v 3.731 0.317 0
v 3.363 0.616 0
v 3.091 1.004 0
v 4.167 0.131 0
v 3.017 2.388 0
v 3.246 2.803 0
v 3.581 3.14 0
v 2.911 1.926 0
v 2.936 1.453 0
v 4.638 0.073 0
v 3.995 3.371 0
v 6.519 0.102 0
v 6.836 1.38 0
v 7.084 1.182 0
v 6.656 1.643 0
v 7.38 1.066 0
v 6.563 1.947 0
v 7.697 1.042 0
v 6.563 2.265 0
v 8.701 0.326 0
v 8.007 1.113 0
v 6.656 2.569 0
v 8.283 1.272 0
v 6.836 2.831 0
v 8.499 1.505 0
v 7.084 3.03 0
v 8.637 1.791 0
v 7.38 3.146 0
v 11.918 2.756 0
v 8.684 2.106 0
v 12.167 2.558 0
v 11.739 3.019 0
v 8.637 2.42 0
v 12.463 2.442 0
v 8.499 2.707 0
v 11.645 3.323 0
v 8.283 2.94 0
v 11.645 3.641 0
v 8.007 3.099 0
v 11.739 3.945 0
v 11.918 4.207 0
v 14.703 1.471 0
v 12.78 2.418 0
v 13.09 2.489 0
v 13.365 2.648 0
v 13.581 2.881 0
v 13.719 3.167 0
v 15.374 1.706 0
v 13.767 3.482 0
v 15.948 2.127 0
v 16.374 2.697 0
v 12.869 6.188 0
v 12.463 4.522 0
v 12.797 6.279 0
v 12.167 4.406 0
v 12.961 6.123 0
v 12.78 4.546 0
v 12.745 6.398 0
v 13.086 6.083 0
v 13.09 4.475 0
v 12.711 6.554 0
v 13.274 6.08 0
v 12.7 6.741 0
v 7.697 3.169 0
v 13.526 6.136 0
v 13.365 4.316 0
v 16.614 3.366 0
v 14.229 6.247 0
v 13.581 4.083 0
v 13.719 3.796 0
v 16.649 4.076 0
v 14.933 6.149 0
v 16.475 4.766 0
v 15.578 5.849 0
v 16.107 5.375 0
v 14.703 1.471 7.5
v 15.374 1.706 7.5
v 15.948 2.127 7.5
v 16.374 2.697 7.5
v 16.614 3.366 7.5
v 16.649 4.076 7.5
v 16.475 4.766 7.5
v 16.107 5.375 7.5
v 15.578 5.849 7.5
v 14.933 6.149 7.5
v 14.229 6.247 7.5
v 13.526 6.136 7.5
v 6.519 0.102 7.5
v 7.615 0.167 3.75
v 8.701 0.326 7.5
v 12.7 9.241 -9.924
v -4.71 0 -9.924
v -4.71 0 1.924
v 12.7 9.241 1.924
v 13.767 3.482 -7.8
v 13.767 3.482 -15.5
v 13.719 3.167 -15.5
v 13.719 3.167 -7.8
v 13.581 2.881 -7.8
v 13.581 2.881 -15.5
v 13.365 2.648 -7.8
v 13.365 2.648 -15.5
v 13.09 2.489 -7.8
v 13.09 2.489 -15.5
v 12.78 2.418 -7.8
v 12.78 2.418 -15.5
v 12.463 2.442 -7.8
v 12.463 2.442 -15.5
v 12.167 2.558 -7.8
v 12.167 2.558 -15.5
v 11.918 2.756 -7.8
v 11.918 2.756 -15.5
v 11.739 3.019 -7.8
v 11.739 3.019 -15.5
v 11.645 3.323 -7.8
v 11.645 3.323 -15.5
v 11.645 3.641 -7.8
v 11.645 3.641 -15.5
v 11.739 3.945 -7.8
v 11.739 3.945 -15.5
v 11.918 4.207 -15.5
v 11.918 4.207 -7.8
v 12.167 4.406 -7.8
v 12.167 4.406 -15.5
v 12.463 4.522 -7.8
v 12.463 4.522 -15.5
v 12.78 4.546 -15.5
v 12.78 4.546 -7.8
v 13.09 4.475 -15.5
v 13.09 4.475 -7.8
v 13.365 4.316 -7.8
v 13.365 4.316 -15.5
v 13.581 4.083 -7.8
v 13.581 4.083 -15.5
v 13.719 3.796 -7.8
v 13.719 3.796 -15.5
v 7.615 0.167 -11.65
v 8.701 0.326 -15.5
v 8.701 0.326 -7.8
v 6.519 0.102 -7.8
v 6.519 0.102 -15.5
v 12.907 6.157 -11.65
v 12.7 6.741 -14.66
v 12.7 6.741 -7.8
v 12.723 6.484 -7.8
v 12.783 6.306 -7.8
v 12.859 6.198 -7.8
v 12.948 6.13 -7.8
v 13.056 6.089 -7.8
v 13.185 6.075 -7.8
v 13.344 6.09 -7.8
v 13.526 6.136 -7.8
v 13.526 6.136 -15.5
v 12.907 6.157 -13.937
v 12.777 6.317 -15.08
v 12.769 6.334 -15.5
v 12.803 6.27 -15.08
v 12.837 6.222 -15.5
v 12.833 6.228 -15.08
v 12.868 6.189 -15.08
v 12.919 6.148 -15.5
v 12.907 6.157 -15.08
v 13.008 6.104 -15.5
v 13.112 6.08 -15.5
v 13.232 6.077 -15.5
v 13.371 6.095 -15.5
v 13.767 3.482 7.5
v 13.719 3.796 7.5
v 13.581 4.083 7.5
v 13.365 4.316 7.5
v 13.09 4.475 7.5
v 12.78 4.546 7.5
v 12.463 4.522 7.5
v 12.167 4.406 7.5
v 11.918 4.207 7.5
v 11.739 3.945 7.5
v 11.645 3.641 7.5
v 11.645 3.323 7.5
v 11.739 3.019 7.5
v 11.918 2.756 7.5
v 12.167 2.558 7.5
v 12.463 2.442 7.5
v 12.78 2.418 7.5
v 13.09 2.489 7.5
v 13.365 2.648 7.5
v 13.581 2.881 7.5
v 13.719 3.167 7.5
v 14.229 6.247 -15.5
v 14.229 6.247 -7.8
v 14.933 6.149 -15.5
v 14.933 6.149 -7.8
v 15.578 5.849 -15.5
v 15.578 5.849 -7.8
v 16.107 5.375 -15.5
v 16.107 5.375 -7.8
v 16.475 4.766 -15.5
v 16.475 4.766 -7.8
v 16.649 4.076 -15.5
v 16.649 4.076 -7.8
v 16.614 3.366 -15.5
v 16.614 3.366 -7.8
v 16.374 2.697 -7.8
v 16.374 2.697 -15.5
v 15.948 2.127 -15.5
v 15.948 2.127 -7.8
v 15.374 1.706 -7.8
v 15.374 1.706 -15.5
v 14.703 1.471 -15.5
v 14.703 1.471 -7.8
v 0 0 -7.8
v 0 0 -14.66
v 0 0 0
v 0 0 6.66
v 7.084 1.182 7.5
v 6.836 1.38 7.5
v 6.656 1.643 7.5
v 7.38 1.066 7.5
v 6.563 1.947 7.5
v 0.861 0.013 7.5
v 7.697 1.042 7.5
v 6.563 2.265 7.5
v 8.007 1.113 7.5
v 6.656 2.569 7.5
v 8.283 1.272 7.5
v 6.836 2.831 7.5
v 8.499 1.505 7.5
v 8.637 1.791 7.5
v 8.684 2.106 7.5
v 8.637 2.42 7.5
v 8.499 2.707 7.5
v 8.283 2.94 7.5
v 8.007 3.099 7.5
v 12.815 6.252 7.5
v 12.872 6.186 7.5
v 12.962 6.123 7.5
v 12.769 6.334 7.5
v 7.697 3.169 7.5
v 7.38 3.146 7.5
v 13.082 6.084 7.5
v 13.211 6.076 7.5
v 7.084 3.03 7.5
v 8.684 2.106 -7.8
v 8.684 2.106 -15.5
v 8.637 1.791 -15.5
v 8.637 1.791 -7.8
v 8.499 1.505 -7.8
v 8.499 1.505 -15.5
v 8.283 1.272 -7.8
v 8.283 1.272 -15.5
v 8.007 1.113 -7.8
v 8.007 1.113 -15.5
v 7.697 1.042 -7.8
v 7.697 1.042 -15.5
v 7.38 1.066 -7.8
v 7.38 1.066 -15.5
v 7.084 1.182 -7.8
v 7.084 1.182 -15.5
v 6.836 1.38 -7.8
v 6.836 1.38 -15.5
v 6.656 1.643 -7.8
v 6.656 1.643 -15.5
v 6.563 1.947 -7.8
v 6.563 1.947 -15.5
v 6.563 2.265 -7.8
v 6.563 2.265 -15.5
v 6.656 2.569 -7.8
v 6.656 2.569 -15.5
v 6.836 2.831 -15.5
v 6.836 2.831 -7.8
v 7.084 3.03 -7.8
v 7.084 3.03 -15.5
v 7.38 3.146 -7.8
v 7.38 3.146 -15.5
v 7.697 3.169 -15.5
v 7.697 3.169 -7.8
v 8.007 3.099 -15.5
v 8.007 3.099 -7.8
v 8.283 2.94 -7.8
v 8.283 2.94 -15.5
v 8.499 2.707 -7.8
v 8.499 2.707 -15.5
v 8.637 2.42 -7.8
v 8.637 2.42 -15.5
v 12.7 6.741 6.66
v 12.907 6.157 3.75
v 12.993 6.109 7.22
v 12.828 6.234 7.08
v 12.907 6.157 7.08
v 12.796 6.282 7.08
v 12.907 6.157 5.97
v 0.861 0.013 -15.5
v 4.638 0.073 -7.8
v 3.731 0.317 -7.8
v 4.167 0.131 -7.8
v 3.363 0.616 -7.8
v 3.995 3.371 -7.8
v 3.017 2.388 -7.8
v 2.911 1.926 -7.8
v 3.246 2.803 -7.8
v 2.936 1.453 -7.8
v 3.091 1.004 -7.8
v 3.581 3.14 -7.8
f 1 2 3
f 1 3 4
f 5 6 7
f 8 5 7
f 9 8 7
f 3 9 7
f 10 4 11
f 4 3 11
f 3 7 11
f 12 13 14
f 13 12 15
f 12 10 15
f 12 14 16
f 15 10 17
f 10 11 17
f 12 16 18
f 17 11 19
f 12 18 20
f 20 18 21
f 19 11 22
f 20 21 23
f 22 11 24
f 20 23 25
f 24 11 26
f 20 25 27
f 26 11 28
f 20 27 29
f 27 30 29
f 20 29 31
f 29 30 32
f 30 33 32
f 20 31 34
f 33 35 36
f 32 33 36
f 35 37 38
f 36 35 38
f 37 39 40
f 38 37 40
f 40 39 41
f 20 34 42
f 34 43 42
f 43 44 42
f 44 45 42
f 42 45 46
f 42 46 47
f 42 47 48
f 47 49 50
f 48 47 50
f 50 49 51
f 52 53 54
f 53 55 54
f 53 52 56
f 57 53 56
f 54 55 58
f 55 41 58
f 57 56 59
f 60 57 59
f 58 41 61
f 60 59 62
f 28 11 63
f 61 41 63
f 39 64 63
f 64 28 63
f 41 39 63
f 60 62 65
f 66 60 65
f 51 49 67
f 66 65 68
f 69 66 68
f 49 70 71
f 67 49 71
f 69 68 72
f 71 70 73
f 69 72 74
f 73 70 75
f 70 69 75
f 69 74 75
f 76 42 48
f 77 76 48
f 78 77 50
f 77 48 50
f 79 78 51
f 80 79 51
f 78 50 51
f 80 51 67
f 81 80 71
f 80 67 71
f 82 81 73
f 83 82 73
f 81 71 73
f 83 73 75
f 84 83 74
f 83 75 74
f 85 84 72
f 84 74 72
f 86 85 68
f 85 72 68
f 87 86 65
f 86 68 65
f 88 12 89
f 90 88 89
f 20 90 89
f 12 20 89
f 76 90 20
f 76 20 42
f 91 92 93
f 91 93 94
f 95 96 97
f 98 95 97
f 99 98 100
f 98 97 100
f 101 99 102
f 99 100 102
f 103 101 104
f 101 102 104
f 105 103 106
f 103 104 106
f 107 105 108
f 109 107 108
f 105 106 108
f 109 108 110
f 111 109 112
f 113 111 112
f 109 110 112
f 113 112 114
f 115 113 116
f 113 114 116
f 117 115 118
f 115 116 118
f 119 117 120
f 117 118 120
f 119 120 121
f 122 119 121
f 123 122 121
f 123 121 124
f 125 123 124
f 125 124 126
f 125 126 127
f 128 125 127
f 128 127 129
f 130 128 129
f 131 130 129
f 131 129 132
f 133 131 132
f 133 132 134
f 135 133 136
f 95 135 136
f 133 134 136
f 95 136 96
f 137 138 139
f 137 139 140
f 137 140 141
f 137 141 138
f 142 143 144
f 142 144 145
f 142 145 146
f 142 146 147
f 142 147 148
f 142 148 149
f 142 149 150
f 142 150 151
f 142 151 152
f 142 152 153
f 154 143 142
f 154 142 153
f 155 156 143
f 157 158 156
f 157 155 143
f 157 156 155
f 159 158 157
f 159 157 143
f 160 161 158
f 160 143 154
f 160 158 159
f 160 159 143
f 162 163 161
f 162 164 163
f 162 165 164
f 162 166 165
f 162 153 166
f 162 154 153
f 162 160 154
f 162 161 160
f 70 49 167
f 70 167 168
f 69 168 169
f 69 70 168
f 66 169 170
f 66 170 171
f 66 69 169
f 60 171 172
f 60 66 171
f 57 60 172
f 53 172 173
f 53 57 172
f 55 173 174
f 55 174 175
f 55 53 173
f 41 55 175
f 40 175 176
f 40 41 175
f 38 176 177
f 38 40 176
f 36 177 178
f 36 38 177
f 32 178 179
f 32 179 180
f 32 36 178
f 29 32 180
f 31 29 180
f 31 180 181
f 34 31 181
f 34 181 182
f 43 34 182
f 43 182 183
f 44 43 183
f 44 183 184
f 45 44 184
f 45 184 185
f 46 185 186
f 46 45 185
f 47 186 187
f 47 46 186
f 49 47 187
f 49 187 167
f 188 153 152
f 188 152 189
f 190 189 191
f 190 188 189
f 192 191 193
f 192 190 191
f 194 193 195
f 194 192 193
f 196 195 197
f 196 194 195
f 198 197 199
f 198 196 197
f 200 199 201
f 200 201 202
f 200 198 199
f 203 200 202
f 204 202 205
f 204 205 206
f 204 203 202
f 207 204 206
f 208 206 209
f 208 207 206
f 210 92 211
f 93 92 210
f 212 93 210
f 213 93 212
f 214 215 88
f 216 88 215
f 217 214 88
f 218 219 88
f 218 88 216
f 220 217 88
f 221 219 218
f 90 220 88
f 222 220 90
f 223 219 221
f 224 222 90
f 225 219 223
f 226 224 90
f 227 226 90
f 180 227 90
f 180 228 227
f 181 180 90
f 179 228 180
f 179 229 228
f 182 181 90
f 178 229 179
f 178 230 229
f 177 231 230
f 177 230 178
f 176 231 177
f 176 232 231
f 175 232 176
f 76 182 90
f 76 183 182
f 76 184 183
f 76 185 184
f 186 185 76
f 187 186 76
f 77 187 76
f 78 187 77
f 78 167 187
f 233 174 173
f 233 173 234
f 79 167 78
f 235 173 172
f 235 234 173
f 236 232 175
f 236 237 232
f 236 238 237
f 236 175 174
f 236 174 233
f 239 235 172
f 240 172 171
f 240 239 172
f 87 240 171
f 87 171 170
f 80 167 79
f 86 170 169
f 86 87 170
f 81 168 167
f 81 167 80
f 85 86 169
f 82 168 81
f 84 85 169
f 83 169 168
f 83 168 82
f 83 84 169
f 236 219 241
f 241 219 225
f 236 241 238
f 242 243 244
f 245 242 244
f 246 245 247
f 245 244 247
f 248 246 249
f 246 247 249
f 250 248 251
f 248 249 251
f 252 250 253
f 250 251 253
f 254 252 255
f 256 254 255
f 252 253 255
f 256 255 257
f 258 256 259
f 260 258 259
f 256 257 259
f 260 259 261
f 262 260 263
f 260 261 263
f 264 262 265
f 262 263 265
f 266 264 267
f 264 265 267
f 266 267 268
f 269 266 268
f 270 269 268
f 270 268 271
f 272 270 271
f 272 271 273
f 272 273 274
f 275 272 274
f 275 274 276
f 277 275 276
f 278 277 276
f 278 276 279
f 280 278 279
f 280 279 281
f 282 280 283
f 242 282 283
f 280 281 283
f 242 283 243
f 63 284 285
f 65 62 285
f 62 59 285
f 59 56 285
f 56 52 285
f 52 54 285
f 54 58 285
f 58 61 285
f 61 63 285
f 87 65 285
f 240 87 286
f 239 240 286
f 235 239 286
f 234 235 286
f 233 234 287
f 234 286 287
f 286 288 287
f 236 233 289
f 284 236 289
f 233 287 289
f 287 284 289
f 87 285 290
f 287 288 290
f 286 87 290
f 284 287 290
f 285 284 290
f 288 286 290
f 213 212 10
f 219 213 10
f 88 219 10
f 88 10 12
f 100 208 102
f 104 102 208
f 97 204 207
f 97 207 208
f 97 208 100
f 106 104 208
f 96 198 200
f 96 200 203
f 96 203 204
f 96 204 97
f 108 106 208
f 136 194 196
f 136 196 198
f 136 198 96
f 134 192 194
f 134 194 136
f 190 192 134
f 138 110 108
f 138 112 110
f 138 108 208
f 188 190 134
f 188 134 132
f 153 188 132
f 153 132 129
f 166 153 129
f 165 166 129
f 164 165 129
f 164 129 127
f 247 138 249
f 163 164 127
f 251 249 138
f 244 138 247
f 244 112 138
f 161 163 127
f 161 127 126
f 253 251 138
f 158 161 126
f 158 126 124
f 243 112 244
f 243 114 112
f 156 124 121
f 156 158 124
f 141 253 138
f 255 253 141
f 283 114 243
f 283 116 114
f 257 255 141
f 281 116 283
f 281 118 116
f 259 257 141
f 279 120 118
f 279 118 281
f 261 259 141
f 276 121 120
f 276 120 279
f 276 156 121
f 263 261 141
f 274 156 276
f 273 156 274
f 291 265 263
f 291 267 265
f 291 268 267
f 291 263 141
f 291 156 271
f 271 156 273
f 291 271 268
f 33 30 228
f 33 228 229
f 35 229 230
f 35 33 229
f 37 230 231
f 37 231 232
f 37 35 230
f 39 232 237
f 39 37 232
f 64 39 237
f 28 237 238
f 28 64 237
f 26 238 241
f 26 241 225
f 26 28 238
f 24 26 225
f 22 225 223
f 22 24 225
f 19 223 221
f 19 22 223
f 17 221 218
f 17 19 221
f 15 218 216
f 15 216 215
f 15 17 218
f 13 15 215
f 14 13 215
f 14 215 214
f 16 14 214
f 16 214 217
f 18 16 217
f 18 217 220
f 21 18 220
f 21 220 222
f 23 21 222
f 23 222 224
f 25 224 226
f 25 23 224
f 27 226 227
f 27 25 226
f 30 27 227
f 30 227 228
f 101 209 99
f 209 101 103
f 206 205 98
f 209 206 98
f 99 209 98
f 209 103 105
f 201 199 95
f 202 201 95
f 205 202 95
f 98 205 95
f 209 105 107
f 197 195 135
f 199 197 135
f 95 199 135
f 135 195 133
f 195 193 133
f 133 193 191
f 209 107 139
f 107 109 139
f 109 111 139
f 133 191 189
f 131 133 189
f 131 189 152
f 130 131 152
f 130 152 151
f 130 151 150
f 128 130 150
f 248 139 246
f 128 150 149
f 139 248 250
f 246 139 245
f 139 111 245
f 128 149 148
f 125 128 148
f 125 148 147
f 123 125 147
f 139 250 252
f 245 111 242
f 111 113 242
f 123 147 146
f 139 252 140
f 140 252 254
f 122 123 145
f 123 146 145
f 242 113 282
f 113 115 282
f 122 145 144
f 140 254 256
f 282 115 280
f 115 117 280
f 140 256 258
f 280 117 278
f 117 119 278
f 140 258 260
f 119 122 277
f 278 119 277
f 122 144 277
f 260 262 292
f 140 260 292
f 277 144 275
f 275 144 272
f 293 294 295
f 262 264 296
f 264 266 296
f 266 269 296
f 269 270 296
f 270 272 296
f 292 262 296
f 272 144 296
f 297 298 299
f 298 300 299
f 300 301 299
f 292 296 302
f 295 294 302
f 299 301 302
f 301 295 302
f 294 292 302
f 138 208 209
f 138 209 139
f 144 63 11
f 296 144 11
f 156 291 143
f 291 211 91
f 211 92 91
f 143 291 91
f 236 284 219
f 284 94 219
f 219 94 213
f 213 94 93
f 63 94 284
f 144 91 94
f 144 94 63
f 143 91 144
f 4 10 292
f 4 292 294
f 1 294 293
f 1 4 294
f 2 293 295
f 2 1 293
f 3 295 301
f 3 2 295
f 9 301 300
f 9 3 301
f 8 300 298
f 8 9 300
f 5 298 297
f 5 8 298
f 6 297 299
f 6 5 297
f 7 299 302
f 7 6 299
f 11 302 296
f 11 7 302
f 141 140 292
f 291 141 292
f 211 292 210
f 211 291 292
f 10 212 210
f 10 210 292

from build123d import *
from OCP.BRepFilletAPI import BRepFilletAPI_MakeChamfer

# Parameters (mm, degrees)
SKETCH1_R           = 1.0668
BOSS_EXTRUDE1_DEPTH = 7.5
BOSS_EXTRUDE2_DEPTH = 7.8
BOSS_EXTRUDE3_START = 7.7
SKETCH3_R           = 1.0668
BOSS_EXTRUDE3_DEPTH = 7.7
BOSS_EXTRUDE4_DEPTH = 23
CHAMFER1_SIZE       = 2.6
CHAMFER1_SIZE2      = 5.575717993


with BuildPart() as part:
    # Sketch1 → Boss-Extrude1 (new body)
    with BuildSketch(Plane.XY):
        with BuildLine():
            Line((0, 0), (6.519373857, 0.102105999))
            add(Edge.make_bspline(
                [(6.519373857, 0.102105999), (7.62, 0.119343933), (8.701246874, 0.325693755)],
                knots=[0, 0, 0, 1, 1, 1], degree=2))
            Line((8.701246874, 0.325693755), (14.703179453, 1.471128487))
            ThreePointArc((14.703179453, 1.471128487), (16.587758943, 4.427434521), (13.526155588, 6.135641216))
            add(Edge.make_bspline(
                [(13.526155588, 6.135641216), (12.7, 5.874844246), (12.7, 6.741186046)],
                knots=[0, 0, 0, 1, 1, 1], degree=2))
            Line((12.7, 6.741186046), (12.7, 9.241186046))
            Line((12.7, 9.241186046), (-4.709853694, 0))
            Line((-4.709853694, 0), (0, 0))
        make_face()
        with Locations((12.7, 3.481838658)):
            Circle(SKETCH1_R, mode=Mode.SUBTRACT)
        with Locations((7.617577591, 2.105666766)):
            Circle(SKETCH1_R, mode=Mode.SUBTRACT)
    extrude(amount=BOSS_EXTRUDE1_DEPTH)

    # Sketch2 → Boss-Extrude2 (add)
    with BuildSketch(Plane(origin=(0, 0, 0), x_dir=(-1, 0, 0), z_dir=(0, 0, -1))):
        Polygon((-12.7, 6.741186046), (4.709853694, 0), (-12.7, 9.241186046), align=None)
    extrude(amount=BOSS_EXTRUDE2_DEPTH)

    # Sketch3 → Boss-Extrude3 (add)
    with BuildSketch(Plane(origin=(0, 0, -7.8), x_dir=(-1, 0, 0), z_dir=(0, 0, -1)).offset(BOSS_EXTRUDE3_START)):
        with BuildLine():
            Line((-12.7, 9.241186046), (-12.7, 6.741186047))
            add(Edge.make_bspline(
                [(-12.7, 6.741186047), (-12.7, 5.874844247), (-13.526155587, 6.135641216)],
                knots=[0, 0, 0, 1, 1, 1], degree=2))
            ThreePointArc((-13.526155587, 6.135641216), (-16.587758943, 4.427434521), (-14.703179453, 1.471128487))
            Line((-14.703179453, 1.471128487), (-8.70124687, 0.325693755))
            add(Edge.make_bspline(
                [(-8.70124687, 0.325693755), (-7.619999998, 0.119343933), (-6.519373857, 0.102105999)],
                knots=[0, 0, 0, 1, 1, 1], degree=2))
            Line((-6.519373857, 0.102105999), (0, 0))
            Line((0, 0), (4.709853694, 0))
            Line((4.709853694, 0), (-12.7, 9.241186046))
        make_face()
        with Locations(Location((-12.7, 3.481838658, 0), (0, 0, 180))):
            Circle(SKETCH3_R, mode=Mode.SUBTRACT)
        with Locations(Location((-7.617577591, 2.105666766, 0), (0, 0, 180))):
            Circle(SKETCH3_R, mode=Mode.SUBTRACT)
    extrude(amount=-BOSS_EXTRUDE3_DEPTH)

    # Sketch4 → Boss-Extrude4 (add)
    with BuildSketch(Plane.XY.offset(7.5)):
        with BuildLine():
            Line((0, 0), (4.638040447, 0.072640681))
            ThreePointArc((4.638040447, 0.072640681), (2.936201023, 1.452503315), (3.995073153, 3.370593023))
            Line((3.995073153, 3.370593023), (3.995073153, 4.620593023))
            Line((3.995073153, 4.620593023), (-4.709853694, 0))
            Line((-4.709853694, 0), (0, 0))
        make_face()
    extrude(amount=-BOSS_EXTRUDE4_DEPTH)

    # Chamfer1: one chamfer whose edges measure the first distance from different faces: ONE call of the kernel's chamfer builder (chamfer() names one face for all edges)
    chamfer1_edges_1 = [part.edges().sort_by_distance(p)[0] for p in [
        (3.995073153, 4.620593023, 7.5),
    ]]
    chamfer1_side_1 = [part.faces().sort_by_distance(p)[0] for p in [
        (7.962373857, 3.352750827, 7.5),
    ]]
    chamfer1_edges_2 = [part.edges().sort_by_distance(p)[0] for p in [
        (3.995073153, 4.620593023, -15.5),
    ]]
    chamfer1_side_2 = [part.faces().sort_by_distance(p)[0] for p in [
        (7.962373857, 3.352750827, -15.5),
    ]]
    chamfer1 = BRepFilletAPI_MakeChamfer(part.part.solid().wrapped)
    for e in chamfer1_edges_1:
        chamfer1.Add(CHAMFER1_SIZE, CHAMFER1_SIZE2, e.wrapped, chamfer1_side_1[0].wrapped)  # the first distance lies on this face
    for e in chamfer1_edges_2:
        chamfer1.Add(CHAMFER1_SIZE, CHAMFER1_SIZE2, e.wrapped, chamfer1_side_2[0].wrapped)  # the first distance lies on this face
    add(Compound.cast(chamfer1.Shape()), mode=Mode.REPLACE)


solid = part.part
